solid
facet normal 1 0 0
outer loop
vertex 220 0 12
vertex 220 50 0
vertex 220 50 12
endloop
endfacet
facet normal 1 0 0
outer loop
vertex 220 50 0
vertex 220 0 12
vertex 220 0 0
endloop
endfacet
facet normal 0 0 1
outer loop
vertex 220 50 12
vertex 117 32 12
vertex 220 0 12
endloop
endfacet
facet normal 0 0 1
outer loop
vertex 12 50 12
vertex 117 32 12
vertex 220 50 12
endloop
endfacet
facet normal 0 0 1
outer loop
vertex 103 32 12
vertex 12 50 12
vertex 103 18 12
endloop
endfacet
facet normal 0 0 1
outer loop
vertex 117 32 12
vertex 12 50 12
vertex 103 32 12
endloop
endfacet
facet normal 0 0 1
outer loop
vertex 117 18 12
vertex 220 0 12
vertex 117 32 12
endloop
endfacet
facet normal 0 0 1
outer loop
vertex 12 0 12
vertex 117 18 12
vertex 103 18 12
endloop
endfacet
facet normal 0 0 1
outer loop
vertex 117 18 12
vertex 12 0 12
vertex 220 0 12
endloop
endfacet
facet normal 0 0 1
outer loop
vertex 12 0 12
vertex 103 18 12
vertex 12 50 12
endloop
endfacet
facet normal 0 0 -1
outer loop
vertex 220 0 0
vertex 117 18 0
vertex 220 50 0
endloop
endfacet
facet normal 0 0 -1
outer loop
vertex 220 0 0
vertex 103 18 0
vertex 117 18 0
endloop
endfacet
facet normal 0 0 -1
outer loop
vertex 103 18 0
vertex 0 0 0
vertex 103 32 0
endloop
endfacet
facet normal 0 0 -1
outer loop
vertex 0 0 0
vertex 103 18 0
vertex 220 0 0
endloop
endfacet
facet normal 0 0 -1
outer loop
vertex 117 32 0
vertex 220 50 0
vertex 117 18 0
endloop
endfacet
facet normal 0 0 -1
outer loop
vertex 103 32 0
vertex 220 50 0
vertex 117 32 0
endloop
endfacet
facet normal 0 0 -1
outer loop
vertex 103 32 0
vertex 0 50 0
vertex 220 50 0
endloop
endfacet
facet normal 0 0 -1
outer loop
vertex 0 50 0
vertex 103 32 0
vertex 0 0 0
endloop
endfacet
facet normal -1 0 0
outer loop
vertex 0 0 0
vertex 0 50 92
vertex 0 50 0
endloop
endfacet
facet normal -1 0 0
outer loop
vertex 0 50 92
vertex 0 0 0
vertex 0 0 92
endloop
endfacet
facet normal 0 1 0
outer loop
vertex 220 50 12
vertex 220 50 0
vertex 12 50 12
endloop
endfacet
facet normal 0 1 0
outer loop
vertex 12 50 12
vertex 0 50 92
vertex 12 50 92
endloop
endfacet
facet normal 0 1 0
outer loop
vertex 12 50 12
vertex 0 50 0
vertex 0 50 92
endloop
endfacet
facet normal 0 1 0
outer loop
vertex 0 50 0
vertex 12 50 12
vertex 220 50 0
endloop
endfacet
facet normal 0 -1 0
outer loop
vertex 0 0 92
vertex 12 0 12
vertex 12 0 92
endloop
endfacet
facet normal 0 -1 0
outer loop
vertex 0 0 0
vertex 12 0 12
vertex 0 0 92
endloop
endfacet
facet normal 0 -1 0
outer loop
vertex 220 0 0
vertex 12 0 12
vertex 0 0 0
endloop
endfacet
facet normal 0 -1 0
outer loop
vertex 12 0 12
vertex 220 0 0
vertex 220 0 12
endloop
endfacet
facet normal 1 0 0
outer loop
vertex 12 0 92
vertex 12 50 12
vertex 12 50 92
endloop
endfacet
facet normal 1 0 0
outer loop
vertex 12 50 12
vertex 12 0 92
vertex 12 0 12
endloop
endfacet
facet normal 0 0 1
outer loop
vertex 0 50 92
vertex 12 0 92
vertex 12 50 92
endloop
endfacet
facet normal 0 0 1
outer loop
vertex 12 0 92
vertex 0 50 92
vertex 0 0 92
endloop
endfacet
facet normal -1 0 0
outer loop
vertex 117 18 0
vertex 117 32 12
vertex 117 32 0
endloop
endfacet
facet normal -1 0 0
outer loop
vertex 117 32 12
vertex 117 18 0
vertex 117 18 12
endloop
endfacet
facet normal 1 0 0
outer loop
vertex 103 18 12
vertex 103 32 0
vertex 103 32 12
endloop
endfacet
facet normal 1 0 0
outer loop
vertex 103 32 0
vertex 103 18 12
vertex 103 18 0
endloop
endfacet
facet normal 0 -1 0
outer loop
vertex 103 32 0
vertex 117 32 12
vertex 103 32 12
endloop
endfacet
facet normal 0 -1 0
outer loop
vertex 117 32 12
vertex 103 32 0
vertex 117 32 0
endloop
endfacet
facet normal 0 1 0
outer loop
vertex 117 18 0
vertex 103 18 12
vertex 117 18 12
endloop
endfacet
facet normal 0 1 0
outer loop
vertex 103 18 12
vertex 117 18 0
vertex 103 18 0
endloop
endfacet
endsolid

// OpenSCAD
$fn = 32;

// ----------------------------------------------------------------------
// Gantry bracket: 200-250 mm L bracket
// ----------------------------------------------------------------------

// --- parameters (mm) ---
base_l = 220;             // base arm length, X
arm_w = 50;               // arm width, Y
thick = 12;               // arm thickness
up_h = 80;                // vertical arm height, Z
slot_w = 14;              // adjustment slot width in the base

total_h = up_h + thick;  // overall height

difference() {
  union() {
    cube([base_l, arm_w, thick]);
    cube([thick, arm_w, total_h]);
  }
  translate([base_l / 2 - slot_w / 2, arm_w / 2 - slot_w / 2, -1])
    cube([slot_w, slot_w, thick + 2]);
}
